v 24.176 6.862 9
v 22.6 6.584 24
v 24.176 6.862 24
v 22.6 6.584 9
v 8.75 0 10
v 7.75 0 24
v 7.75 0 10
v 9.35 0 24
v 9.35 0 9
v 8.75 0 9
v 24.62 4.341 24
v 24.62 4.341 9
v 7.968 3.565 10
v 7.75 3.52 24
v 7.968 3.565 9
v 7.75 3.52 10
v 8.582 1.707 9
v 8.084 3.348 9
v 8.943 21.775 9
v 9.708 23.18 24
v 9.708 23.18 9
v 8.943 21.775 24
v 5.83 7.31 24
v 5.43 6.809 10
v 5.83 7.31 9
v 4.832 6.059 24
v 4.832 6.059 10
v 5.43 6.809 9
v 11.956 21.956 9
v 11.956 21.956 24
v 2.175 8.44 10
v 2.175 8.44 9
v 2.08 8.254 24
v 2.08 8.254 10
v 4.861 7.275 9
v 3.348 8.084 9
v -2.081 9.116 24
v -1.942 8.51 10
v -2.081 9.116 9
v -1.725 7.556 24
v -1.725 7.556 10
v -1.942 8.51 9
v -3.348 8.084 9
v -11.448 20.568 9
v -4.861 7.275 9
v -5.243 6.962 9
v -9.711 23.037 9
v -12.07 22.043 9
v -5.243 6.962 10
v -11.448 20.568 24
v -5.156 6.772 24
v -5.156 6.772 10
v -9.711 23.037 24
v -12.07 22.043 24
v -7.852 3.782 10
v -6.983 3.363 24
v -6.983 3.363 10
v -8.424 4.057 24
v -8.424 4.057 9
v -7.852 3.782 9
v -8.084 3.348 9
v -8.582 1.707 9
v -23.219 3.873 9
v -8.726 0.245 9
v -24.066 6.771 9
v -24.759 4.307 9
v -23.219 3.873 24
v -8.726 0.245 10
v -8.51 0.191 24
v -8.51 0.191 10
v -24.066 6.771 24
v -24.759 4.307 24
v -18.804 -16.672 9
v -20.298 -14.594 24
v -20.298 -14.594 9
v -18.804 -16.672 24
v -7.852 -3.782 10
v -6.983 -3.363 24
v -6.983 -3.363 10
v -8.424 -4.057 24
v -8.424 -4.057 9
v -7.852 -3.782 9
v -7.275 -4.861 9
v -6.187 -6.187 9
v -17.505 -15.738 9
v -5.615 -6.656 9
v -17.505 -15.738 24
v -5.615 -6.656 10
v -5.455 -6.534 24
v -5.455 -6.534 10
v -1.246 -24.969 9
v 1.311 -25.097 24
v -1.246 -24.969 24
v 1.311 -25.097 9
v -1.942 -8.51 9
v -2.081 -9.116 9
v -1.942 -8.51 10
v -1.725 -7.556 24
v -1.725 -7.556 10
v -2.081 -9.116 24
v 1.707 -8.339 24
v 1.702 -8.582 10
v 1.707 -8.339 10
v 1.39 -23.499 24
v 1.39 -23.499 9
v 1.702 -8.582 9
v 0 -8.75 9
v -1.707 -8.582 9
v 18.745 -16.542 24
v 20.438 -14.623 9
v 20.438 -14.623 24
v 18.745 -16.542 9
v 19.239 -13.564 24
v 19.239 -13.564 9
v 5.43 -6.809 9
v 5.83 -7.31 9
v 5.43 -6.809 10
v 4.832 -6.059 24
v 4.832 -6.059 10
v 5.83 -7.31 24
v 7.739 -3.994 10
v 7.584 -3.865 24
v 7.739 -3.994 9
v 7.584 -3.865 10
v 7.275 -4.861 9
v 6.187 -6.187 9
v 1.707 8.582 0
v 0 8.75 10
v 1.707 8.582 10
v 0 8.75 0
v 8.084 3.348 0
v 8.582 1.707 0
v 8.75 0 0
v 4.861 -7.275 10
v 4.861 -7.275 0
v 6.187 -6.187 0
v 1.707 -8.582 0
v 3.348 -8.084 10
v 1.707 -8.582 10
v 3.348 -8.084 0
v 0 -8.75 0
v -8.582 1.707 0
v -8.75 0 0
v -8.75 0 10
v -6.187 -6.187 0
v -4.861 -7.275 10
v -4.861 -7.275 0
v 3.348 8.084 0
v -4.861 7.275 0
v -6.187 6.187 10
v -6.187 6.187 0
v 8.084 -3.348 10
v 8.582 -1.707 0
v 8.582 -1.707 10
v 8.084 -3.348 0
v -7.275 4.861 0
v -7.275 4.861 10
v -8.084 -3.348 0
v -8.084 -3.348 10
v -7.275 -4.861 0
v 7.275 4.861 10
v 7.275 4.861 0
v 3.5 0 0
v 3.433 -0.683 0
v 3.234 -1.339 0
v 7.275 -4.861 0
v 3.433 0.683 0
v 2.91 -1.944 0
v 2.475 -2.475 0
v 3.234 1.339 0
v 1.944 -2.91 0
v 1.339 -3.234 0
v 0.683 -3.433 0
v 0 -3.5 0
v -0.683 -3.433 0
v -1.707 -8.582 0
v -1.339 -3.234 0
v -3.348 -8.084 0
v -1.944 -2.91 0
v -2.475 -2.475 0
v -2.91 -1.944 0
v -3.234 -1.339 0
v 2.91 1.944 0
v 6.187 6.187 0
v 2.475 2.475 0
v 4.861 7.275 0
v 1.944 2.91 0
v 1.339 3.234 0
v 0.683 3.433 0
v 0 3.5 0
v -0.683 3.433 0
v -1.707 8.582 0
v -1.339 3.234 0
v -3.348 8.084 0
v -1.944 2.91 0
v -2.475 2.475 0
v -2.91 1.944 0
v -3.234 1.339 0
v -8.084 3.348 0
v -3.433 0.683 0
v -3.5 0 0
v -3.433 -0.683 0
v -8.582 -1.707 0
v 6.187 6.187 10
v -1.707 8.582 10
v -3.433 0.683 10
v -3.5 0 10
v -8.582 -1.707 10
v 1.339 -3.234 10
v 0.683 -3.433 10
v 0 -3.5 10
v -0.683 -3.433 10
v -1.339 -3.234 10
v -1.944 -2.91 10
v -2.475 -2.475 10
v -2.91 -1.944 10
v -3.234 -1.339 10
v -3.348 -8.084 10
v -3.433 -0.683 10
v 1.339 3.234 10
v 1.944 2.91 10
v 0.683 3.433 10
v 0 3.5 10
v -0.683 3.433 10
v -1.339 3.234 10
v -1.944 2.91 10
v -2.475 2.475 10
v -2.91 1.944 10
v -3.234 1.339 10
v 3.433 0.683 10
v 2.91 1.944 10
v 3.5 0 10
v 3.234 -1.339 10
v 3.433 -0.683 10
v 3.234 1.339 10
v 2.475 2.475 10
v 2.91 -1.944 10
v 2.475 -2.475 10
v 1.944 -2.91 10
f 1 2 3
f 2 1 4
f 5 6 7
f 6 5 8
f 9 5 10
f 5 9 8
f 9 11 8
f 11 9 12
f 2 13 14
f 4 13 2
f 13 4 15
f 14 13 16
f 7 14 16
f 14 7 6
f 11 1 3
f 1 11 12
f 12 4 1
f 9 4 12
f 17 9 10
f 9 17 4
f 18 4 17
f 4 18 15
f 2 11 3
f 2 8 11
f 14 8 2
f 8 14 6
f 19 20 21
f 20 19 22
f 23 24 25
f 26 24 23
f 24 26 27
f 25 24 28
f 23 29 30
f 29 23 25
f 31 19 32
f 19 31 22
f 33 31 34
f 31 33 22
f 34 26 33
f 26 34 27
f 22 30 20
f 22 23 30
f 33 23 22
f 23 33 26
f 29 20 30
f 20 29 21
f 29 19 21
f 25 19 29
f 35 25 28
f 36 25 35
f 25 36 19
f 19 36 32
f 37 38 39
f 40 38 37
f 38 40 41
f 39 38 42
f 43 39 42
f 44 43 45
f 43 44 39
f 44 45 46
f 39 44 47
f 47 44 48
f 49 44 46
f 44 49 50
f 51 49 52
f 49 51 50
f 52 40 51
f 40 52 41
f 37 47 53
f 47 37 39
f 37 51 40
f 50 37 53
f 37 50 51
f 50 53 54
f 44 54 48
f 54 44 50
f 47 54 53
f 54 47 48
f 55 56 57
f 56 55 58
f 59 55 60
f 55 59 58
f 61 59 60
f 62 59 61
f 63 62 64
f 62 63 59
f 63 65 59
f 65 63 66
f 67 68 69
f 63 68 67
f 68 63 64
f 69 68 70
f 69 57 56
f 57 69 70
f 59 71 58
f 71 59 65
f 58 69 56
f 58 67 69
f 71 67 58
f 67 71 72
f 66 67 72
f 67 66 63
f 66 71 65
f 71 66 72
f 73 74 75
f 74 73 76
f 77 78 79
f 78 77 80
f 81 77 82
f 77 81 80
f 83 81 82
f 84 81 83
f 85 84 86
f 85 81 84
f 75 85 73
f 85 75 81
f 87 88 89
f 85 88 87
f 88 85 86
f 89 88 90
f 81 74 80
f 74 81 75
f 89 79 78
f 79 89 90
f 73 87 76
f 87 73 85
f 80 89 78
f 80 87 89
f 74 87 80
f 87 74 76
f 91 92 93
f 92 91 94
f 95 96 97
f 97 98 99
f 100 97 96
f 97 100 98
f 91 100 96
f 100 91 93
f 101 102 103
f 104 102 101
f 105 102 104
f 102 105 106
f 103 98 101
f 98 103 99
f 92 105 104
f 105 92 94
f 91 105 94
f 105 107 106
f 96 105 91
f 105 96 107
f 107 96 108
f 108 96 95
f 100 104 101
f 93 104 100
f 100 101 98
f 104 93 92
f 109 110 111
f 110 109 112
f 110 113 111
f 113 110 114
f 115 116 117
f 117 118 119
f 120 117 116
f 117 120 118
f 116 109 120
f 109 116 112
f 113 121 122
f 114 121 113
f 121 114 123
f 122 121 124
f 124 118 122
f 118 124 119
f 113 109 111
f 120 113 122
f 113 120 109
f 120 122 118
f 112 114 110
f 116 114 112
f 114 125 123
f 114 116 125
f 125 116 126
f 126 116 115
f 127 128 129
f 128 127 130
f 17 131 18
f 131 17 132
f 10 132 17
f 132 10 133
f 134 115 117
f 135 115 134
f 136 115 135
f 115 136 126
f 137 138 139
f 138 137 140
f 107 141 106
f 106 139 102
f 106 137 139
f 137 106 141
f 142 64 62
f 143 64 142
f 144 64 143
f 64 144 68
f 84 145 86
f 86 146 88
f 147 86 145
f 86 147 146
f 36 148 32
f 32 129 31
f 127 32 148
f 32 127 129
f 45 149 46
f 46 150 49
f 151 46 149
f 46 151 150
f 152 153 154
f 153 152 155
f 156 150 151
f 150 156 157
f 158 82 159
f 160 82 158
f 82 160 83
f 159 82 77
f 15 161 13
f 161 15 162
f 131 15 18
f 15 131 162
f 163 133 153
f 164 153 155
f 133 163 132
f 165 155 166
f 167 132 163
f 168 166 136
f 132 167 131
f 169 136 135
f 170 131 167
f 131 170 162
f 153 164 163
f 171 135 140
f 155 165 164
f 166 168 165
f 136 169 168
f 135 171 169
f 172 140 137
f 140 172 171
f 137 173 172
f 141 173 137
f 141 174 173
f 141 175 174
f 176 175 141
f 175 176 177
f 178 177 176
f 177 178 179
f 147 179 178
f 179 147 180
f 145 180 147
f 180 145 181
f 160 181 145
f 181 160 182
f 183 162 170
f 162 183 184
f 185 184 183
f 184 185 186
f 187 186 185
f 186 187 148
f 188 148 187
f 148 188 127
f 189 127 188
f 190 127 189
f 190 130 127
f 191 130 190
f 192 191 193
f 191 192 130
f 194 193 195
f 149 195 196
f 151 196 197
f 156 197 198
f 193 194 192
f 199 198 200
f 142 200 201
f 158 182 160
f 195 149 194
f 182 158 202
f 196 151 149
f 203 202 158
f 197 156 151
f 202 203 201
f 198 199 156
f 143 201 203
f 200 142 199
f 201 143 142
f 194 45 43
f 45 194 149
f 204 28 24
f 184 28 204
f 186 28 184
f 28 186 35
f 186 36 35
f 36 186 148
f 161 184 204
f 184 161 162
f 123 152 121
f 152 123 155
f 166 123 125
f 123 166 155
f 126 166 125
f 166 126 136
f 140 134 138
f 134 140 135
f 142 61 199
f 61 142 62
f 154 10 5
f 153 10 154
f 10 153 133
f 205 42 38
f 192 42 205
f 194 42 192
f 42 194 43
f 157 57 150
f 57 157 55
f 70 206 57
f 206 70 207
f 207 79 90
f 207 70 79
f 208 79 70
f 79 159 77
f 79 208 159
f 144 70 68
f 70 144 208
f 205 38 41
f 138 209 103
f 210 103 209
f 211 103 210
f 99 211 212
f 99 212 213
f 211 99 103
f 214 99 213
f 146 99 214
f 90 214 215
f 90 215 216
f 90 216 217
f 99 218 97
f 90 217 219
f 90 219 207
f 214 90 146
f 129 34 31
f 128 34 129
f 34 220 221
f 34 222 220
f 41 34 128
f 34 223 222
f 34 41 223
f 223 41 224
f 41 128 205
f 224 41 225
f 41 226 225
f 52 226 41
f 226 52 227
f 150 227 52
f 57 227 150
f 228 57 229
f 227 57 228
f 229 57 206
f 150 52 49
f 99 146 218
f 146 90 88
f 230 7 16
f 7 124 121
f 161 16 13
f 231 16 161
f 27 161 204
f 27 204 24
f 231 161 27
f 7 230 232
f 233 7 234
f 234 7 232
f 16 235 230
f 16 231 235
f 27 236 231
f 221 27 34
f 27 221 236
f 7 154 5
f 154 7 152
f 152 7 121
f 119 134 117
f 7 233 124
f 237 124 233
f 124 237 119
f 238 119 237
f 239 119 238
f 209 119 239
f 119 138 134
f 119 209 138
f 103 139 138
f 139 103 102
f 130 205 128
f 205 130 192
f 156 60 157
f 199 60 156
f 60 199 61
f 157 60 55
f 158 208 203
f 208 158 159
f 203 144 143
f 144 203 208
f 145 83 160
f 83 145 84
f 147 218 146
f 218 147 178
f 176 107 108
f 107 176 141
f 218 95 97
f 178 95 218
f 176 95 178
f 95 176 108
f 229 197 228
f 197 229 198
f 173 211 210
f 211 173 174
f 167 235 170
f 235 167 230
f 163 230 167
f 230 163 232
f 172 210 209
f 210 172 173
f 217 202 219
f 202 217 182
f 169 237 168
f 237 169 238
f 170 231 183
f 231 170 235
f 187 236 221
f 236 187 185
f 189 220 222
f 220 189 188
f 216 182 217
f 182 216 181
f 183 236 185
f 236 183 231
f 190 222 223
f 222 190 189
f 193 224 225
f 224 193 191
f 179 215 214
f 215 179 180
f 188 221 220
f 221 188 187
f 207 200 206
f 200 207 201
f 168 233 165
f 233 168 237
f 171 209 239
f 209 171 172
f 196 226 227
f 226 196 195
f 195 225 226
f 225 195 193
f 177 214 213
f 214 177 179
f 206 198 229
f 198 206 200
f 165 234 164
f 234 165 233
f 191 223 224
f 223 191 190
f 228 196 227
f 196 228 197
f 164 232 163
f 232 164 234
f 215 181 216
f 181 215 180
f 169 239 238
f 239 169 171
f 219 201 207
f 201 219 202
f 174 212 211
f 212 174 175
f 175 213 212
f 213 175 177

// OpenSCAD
$fn = 32;

// ----------------------------------------------------------------------
// Impeller: 50 mm, 7 blades, 24 mm tall
// ----------------------------------------------------------------------

// --- parameters (mm) ---
center_d = 17.5;          // hub diameter
center_h = 10;            // hub height
wheel_d = 50;             // outer diameter over the blades
blade_count = 7;          // number of blades
blade_t = 1.6;            // blade thickness
blade_h = 14;             // blade height
blade_in_r = 7.75;        // blade root radius
blade_out_r = 23.4;       // blade tip radius
sweep = 10;               // blade sweep, degrees
bore_d = 7;               // shaft bore

module hub() {
  cylinder(h = center_h, d = center_d);
}

module blade() {
  /* blade swept between two boxes: hull of the root and the tip section */
  hull() {
    translate([blade_in_r, 0, center_h - 1])
      cube([blade_t, blade_t * 2.2, blade_h + 1], center = false);
    rotate([0, 0, sweep])
      translate([blade_out_r, 0, center_h - 1])
        cube([blade_t, blade_t * 1.6, blade_h + 1], center = false);
  }
}

module blades() {
  for (i = [0 : blade_count - 1])
    rotate([0, 0, i * 360 / blade_count]) blade();
}

difference() {
  union() {
    hub();
    blades();
  }
  translate([0, 0, -1]) cylinder(h = center_h + blade_h + 0 + 3, d = bore_d);
}
